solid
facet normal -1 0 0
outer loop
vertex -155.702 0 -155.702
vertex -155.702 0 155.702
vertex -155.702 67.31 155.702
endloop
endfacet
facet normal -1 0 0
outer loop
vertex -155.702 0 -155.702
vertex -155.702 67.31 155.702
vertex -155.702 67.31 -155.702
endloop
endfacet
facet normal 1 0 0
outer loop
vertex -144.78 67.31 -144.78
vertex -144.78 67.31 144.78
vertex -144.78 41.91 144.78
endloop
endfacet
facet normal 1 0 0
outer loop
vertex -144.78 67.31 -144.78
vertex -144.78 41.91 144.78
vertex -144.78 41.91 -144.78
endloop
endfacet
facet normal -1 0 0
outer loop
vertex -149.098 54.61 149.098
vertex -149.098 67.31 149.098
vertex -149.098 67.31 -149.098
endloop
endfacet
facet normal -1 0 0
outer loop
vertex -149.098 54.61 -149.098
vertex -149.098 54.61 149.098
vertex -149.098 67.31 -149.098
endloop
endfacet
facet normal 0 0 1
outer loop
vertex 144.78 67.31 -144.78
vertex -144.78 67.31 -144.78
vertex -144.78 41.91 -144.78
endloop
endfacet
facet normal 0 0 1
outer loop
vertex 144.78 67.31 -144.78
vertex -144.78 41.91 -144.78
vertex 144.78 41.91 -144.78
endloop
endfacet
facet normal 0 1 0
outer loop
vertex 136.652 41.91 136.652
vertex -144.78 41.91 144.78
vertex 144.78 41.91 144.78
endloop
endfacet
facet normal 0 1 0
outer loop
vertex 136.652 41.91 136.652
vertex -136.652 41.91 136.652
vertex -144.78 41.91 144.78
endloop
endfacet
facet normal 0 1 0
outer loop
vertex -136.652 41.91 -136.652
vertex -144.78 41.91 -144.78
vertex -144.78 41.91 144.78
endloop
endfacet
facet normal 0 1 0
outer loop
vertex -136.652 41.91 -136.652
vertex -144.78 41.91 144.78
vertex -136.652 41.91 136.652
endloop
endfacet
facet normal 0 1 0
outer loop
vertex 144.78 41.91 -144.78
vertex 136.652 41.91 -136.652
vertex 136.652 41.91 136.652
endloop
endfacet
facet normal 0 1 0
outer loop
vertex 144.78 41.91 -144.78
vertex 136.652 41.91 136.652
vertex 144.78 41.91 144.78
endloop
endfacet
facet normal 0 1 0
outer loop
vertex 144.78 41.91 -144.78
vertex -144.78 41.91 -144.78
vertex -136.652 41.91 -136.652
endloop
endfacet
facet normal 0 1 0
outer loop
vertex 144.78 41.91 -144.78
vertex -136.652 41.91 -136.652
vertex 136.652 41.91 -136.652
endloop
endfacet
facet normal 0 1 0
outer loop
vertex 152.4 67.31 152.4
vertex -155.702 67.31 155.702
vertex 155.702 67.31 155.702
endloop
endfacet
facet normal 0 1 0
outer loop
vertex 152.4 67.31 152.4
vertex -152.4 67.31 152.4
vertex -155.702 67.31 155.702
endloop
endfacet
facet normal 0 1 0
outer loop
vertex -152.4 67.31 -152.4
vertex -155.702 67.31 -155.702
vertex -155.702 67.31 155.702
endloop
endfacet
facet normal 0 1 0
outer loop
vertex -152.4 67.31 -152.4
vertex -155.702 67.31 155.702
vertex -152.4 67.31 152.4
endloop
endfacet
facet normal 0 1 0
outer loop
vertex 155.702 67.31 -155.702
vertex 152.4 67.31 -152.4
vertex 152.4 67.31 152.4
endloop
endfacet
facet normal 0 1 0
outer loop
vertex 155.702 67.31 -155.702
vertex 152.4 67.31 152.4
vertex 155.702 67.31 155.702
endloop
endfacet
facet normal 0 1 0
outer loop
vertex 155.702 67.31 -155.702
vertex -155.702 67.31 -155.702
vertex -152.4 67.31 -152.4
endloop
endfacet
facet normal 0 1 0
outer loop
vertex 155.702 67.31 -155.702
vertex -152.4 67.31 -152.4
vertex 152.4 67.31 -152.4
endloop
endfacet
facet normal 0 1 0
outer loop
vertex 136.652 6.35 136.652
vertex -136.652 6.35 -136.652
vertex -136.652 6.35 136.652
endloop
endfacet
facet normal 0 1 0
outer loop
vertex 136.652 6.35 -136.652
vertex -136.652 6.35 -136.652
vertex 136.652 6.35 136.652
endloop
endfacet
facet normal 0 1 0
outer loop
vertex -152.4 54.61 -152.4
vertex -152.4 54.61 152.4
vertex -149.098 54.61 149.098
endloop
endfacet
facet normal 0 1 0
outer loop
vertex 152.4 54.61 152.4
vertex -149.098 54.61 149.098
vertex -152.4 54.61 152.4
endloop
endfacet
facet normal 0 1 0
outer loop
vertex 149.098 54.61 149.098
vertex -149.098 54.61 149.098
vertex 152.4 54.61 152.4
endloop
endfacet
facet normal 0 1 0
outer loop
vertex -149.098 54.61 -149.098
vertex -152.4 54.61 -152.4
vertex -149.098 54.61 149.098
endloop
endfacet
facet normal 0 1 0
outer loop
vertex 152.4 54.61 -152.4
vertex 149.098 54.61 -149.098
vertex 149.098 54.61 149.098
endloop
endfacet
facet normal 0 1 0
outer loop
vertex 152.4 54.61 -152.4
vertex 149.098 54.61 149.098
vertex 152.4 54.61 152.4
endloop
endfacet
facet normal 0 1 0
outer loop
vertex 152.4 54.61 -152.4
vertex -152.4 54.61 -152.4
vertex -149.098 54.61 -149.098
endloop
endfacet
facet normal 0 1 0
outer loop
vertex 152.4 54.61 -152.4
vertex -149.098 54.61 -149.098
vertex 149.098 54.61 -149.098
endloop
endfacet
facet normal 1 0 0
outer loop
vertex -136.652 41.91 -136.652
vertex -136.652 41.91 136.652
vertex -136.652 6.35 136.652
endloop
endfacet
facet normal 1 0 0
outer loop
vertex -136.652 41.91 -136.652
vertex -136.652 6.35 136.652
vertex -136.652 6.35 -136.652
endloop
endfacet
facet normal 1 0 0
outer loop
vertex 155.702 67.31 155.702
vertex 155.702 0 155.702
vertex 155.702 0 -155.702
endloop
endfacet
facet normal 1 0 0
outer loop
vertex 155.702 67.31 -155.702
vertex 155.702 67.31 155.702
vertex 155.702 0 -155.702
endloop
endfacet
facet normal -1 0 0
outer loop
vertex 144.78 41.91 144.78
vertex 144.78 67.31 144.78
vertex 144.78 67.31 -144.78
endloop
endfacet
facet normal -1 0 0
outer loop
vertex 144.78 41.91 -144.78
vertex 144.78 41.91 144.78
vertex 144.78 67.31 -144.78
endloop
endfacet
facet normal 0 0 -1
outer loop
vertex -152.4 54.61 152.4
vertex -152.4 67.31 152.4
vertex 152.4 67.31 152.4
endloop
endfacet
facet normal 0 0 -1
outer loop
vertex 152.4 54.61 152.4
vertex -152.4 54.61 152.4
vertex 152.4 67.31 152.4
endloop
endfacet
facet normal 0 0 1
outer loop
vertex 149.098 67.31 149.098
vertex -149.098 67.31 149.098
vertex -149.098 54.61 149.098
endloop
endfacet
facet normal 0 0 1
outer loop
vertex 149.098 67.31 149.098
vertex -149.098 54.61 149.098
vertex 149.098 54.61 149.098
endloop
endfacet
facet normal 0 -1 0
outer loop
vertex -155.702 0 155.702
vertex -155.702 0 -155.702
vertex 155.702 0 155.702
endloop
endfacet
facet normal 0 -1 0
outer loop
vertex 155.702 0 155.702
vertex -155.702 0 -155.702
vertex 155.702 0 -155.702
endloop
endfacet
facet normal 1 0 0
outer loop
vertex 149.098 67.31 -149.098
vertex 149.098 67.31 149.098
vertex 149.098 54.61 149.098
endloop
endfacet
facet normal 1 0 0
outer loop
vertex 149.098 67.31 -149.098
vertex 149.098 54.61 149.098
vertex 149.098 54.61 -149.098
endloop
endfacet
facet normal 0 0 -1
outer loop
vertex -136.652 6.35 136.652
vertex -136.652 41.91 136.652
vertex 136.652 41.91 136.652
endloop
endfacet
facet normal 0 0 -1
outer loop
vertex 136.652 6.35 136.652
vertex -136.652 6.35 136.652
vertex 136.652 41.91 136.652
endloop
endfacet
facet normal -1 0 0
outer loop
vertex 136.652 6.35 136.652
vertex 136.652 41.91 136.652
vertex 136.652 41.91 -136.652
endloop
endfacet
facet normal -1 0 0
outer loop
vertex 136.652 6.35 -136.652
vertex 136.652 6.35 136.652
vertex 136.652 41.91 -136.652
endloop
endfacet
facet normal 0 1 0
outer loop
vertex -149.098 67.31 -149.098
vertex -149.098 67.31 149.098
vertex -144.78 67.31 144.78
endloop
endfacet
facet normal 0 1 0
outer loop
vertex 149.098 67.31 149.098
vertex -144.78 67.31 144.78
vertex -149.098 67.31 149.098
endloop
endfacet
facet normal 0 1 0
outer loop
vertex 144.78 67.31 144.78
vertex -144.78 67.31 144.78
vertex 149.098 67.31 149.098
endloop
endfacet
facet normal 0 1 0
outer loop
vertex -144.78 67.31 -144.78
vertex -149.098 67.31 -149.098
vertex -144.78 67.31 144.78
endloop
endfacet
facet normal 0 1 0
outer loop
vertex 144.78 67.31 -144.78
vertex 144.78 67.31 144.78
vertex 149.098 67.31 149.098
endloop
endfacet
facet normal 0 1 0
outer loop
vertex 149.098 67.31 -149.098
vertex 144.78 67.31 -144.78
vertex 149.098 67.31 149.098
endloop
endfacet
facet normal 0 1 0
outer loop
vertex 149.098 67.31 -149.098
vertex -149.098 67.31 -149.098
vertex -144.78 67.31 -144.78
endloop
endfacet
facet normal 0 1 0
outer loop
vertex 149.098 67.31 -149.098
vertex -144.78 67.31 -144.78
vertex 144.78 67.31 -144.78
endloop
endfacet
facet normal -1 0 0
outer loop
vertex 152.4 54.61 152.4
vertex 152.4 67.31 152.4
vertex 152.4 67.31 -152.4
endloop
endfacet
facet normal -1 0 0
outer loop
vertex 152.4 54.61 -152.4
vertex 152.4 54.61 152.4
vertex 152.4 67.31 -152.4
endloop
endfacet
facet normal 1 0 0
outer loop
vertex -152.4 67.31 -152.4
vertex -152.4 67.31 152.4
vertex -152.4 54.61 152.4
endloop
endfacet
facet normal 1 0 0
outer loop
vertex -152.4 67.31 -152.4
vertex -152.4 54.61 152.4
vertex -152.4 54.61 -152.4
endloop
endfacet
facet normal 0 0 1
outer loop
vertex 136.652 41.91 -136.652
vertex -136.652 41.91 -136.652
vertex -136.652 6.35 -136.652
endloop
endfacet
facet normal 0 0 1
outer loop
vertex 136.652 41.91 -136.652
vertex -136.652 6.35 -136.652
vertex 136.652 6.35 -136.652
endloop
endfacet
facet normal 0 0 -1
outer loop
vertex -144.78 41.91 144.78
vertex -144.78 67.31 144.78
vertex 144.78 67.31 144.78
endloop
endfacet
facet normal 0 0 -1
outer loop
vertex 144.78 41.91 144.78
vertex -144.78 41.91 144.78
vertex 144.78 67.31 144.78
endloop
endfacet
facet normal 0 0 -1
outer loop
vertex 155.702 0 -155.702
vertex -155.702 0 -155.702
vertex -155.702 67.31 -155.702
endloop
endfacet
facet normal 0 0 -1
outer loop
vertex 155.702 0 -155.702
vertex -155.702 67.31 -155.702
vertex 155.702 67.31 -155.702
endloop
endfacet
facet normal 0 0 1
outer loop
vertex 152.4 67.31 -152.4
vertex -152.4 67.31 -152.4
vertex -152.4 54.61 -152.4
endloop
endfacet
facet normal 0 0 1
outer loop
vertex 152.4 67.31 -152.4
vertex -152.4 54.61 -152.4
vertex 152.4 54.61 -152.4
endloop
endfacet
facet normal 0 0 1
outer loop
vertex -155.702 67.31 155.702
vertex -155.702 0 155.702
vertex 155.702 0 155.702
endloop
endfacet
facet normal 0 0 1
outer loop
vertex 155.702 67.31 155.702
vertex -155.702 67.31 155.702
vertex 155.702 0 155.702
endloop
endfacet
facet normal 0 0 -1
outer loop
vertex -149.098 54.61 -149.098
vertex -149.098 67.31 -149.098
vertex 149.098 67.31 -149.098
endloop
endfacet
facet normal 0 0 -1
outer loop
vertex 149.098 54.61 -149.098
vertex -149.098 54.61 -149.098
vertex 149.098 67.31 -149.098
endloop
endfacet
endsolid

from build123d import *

# Parameters (mm, degrees)
SKETCH2_W           = 311.404
SKETCH2_H           = 311.404
BOSS_EXTRUDE1_DEPTH = 67.31
SKETCH4_W           = 289.56
SKETCH4_H           = 289.56
CUT_EXTRUDE1_DEPTH  = 25.4
SKETCH5_W           = 273.304
SKETCH5_H           = 273.304
CUT_EXTRUDE2_DEPTH  = 60.96
SKETCH6_W           = 304.8
SKETCH6_H           = 304.8
SKETCH6_W_2         = 298.196
SKETCH6_H_2         = 298.196
CUT_EXTRUDE3_DEPTH  = 12.7


with BuildPart() as part:
    # Sketch2 → Boss-Extrude1 (new body)
    with BuildSketch(Plane(origin=(0, 0, 0), x_dir=(1, 0, 0), z_dir=(0, 1, 0))):
        Rectangle(SKETCH2_W, SKETCH2_H)
    extrude(amount=BOSS_EXTRUDE1_DEPTH)

    # Sketch4 → Cut-Extrude1 (cut)
    with BuildSketch(Plane(origin=(0, 67.31, 0), x_dir=(1, 0, 0), z_dir=(0, 1, 0))):
        Rectangle(SKETCH4_W, SKETCH4_H)
    extrude(amount=-CUT_EXTRUDE1_DEPTH, mode=Mode.SUBTRACT)

    # Sketch5 → Cut-Extrude2 (cut)
    with BuildSketch(Plane(origin=(0, 67.31, 0), x_dir=(1, 0, 0), z_dir=(0, 1, 0))):
        Rectangle(SKETCH5_W, SKETCH5_H)
    extrude(amount=-CUT_EXTRUDE2_DEPTH, mode=Mode.SUBTRACT)

    # Sketch6 → Cut-Extrude3 (cut)
    with BuildSketch(Plane(origin=(0, 67.31, 0), x_dir=(1, 0, 0), z_dir=(0, 1, 0))):
        Rectangle(SKETCH6_W, SKETCH6_H)
        Rectangle(SKETCH6_W_2, SKETCH6_H_2, mode=Mode.SUBTRACT)
    extrude(amount=-CUT_EXTRUDE3_DEPTH, mode=Mode.SUBTRACT)


solid = part.part
